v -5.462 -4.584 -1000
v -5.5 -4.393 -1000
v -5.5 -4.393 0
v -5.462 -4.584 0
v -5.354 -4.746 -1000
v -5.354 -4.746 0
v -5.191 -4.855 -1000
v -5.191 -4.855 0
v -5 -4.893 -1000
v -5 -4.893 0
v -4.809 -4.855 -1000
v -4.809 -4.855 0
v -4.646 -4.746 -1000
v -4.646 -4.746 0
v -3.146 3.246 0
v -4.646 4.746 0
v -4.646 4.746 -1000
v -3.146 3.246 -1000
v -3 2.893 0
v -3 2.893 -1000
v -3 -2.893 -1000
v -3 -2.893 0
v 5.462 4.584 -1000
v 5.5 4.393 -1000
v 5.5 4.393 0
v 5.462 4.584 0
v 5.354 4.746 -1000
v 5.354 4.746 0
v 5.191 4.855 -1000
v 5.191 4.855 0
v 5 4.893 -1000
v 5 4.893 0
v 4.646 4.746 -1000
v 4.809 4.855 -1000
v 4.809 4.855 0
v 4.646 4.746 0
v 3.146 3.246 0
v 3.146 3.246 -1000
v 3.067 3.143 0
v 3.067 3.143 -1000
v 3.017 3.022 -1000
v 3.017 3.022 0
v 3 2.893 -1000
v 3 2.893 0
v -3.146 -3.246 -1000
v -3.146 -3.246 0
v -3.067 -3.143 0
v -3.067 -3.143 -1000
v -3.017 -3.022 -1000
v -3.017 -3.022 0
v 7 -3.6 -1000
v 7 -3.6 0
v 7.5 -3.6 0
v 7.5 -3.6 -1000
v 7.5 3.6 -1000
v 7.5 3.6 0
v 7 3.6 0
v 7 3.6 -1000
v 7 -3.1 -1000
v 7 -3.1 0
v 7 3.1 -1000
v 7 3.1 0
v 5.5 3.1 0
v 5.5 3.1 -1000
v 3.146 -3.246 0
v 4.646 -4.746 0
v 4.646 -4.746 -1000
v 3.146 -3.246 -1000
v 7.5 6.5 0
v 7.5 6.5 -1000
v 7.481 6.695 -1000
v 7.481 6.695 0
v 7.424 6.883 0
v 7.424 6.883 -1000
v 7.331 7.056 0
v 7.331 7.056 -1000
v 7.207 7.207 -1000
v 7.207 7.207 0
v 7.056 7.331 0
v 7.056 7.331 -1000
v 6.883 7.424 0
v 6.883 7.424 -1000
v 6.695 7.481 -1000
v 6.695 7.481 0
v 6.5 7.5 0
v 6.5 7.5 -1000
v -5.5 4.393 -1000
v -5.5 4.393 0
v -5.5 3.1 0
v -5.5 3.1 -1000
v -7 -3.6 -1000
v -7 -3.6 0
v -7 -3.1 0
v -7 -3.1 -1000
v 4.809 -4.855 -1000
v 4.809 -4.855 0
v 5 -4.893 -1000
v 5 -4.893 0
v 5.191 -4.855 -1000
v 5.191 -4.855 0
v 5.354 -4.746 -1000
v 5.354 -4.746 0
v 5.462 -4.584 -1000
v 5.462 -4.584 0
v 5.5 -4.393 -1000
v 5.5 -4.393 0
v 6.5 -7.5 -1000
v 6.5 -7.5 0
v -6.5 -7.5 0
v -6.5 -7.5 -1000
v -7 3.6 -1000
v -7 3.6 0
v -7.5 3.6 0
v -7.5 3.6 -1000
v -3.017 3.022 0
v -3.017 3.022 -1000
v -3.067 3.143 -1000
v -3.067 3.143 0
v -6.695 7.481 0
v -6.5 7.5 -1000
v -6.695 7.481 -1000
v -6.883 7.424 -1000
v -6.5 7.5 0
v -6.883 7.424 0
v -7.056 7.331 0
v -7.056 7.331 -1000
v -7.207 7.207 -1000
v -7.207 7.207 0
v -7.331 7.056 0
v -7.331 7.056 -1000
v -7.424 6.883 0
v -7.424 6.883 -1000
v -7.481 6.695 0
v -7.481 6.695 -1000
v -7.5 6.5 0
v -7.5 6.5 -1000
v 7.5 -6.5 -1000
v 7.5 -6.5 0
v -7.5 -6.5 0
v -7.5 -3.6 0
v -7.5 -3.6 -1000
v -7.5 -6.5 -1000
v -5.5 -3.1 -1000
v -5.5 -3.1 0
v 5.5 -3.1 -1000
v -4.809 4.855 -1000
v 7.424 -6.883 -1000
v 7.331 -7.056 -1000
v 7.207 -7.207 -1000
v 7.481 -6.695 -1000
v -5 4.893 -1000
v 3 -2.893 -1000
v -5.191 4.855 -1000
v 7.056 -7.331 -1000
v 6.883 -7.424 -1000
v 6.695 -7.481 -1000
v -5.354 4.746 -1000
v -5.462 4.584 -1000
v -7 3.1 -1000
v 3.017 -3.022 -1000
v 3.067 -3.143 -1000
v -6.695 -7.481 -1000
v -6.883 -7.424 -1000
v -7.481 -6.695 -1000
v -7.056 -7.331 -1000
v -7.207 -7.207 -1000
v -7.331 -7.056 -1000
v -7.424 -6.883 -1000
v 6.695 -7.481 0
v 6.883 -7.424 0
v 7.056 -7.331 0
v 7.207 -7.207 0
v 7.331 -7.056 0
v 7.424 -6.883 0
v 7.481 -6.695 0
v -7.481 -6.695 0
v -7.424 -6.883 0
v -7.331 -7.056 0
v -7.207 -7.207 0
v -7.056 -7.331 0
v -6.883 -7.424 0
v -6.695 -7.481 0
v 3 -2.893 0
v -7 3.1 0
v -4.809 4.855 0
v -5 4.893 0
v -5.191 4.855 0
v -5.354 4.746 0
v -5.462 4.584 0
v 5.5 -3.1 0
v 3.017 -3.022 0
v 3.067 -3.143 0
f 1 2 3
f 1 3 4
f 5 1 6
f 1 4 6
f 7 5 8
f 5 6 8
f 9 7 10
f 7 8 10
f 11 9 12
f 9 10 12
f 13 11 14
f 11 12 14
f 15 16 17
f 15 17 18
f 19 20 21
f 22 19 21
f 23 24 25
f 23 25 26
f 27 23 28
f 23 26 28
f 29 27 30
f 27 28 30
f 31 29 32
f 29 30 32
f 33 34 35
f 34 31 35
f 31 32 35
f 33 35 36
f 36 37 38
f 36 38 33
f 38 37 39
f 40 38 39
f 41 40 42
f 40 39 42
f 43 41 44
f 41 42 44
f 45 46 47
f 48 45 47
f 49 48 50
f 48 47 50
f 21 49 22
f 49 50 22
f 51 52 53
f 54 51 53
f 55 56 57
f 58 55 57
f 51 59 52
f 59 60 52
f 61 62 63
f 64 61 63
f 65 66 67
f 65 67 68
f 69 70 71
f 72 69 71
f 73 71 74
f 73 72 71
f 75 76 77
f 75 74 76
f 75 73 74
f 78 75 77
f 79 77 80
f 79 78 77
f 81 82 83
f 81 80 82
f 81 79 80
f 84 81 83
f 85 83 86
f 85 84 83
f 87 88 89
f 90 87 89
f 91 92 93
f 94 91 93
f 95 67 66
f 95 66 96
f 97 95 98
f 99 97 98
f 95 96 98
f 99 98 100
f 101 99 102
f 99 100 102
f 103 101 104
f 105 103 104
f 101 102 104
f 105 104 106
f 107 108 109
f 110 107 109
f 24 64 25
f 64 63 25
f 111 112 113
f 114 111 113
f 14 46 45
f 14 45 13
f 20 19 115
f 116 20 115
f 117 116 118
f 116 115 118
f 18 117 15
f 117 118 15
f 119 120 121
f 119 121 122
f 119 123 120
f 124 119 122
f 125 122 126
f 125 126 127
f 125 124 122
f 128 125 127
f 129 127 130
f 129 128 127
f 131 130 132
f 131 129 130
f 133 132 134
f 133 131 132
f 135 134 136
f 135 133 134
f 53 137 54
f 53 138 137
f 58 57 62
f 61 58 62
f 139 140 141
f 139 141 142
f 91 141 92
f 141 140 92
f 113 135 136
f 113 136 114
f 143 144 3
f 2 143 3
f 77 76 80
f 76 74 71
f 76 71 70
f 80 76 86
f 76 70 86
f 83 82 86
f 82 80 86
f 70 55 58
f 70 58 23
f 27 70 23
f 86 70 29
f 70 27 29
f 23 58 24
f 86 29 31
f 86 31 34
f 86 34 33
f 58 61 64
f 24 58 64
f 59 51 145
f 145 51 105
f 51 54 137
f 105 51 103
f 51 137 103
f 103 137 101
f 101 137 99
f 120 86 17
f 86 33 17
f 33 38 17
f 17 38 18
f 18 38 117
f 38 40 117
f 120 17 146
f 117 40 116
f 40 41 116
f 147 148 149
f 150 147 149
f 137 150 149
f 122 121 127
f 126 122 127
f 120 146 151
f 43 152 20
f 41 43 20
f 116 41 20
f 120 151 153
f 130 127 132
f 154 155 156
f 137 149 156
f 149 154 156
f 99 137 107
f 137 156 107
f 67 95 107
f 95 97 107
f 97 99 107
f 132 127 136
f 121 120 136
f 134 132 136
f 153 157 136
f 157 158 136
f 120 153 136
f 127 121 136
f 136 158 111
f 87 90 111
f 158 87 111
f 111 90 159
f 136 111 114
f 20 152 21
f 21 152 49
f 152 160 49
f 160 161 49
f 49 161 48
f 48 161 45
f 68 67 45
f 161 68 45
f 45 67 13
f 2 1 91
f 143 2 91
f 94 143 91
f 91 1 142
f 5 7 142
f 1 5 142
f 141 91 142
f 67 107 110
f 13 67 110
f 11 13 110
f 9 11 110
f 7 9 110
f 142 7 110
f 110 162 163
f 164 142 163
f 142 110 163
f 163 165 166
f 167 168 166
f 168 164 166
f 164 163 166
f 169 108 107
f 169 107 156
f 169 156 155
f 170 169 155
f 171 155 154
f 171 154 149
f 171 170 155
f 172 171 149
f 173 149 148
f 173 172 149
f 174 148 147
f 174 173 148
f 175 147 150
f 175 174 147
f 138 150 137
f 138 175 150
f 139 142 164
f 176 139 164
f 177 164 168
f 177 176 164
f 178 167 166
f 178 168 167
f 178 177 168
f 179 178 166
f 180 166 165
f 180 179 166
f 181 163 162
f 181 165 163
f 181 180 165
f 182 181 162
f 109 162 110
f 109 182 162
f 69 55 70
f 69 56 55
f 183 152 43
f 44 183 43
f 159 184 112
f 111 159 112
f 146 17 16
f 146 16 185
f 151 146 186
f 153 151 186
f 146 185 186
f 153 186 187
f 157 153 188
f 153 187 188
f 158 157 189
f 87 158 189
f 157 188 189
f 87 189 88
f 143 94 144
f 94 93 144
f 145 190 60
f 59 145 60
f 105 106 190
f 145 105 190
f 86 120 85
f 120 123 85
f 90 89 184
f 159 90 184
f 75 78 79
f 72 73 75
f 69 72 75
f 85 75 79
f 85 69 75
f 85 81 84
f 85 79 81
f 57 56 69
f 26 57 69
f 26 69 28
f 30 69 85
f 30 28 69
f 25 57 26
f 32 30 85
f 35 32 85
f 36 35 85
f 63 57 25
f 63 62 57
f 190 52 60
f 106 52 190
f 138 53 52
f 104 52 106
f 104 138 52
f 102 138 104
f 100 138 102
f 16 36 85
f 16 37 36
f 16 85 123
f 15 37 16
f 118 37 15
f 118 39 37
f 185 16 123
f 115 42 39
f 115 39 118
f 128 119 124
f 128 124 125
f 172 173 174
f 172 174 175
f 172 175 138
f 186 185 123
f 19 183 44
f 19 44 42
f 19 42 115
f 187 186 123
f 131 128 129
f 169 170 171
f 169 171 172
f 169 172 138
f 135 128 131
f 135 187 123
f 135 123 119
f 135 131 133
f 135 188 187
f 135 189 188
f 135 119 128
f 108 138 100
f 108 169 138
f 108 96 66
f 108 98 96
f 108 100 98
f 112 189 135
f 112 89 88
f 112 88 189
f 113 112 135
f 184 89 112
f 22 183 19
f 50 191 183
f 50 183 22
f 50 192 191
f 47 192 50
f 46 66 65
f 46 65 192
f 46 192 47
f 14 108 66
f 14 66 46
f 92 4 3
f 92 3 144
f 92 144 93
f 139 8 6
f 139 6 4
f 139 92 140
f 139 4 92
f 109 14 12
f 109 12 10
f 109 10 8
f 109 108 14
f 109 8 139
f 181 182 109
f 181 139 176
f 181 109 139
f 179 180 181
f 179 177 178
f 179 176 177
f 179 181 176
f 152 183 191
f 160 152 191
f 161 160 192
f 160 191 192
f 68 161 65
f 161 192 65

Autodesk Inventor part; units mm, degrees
ref_plane "YZ Plane" through (0, 0, 0) normal (1, 0, 0) x (0, 1, 0)
ref_plane "XZ Plane" through (0, 0, 0) normal (0, 1, 0) x (-1, 0, 0)
ref_plane "XY Plane" through (0, 0, 0) normal (0, 0, 1) x (1, 0, 0)
sketch "Sketch1" plane through (0, 0, 0) normal (0, 0, 1) x (1, 0, 0)
  line L0 (-7.5, 7.5) -> (7.5, 7.5) construction
  line L1 (-7.5, 7.5) -> (-7.5, 3.1) construction
  line L2 (-7.5, 3.1) -> (-5.5, 3.1) construction
  line L3 (-5.5, 5.6) -> (-5.5, 3.1) construction
  line L4 (-5.5, 5.6) -> (-3, 3.1) construction
  line L5 (-3, 0) -> (0, 0)
  line L6 (0, 0) -> (0, 7.5)
  arc A0 (-6.5, 7.5) -> (-7.5, 6.5) centre (-6.5, 6.5) ccw
  line L7 (-7.5, 6.5) -> (-7.5, 3.1) construction
  line L8 (-6.5, 7.5) -> (0, 7.5)
  arc A1 (-4.6464, 4.7464) -> (-5.5, 4.3929) centre (-5, 4.3929) ccw
  line L9 (-5.5, 4.3929) -> (-5.5, 3.1)
  line L10 (-3, 3.1) -> (-3, 0) construction
  arc A2 (-3, 2.8929) -> (-3.1464, 3.2464) centre (-3.5, 2.8929) ccw
  line L11 (-4.6464, 4.7464) -> (-3.1464, 3.2464)
  line L12 (-3, 2.8929) -> (-3, 0)
  line L13 (-7.5, 3.1) -> (-7, 3.1) construction
  line L14 (-7, 3.1) -> (-7, 3.6)
  line L15 (-7, 3.6) -> (-7.5, 3.6)
  line L16 (-7.5, 3.6) -> (-7.5, 3.1) construction
  line L17 (-7.5, 6.5) -> (-7.5, 3.6)
  line L18 (-5.5, 3.1) -> (-7, 3.1)
  dimension "d0" = 15
  dimension "d1" = 7.5
  dimension "d3" = 2
  dimension "d4" = 2.5
  dimension "d5" = 45
  dimension "d9" = 1
  dimension "d10" = 0.5
  dimension "d11" = 0.5
  dimension "d12" = 0.5
  dimension "d13" = 3.1
extrude "Extrusion1" add sketch "Sketch1" against normal blind 1000
mirror "Mirror3" about plane through (0, 0, 0) normal (1, 0, 0) of "Extrusion1"
mirror "Mirror4" about plane through (0, 0, 0) normal (0, 1, 0) of "Extrusion1", "Mirror3"
equation "\"d1\" = 0.5 * d0"
properties part number "profile_0001_0001"
